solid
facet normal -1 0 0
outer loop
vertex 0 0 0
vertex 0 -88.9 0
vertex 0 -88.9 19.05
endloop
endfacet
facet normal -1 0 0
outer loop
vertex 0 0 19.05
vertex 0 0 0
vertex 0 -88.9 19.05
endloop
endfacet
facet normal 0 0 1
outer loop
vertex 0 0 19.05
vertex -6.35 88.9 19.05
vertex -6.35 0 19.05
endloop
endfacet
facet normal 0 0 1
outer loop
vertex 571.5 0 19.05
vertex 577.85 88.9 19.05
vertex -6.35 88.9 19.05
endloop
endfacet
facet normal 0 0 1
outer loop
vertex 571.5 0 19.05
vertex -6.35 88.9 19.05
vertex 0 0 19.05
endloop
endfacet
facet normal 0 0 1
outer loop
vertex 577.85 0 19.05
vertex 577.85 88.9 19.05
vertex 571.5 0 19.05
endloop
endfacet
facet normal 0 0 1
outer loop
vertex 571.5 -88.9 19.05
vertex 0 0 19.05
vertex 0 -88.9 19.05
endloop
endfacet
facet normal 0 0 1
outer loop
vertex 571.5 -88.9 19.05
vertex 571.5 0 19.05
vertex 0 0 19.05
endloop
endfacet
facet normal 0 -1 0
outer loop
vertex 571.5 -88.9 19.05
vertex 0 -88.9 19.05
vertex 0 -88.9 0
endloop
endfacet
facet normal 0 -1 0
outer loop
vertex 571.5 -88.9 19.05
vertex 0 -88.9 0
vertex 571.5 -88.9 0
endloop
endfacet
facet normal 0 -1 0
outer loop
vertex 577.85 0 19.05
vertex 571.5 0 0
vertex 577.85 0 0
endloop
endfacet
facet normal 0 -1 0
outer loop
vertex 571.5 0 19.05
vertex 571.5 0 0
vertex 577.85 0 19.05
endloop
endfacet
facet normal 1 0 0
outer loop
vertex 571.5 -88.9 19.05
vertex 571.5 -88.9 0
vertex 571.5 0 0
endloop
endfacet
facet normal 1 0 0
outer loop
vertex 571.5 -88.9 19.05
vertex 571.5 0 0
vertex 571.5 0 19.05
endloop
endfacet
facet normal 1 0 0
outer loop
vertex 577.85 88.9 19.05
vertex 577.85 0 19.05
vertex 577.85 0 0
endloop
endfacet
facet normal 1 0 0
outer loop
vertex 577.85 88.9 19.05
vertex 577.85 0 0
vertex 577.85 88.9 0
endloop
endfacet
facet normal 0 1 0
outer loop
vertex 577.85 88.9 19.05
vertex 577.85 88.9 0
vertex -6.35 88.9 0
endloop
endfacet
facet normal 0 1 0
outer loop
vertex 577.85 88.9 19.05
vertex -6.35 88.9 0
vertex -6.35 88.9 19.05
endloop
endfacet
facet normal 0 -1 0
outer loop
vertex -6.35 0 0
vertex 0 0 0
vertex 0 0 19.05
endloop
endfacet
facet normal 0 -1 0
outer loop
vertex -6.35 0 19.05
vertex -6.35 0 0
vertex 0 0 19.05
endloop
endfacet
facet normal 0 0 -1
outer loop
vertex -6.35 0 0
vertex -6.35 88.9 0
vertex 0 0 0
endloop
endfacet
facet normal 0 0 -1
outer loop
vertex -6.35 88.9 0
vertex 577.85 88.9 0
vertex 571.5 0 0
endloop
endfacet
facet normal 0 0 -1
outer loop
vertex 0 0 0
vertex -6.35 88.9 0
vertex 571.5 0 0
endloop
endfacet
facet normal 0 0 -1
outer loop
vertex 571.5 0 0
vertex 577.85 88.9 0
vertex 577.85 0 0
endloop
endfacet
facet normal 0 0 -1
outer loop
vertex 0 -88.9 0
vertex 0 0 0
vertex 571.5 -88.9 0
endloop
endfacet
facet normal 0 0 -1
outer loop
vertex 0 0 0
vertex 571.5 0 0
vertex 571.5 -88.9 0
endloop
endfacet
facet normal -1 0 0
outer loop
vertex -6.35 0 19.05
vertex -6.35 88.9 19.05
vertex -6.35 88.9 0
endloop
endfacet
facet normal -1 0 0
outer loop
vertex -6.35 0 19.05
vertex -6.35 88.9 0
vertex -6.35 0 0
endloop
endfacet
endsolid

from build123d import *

# Parameters (mm, degrees)
F0_W          = 571.5
F0_H          = 19.05
F1_DEPTH      = 88.9
F2_W          = 88.9
F2_H          = 19.05
F3_DEPTH      = 6.35
F4_W          = 88.9
F4_H          = 19.05
F5_DEPTH      = 6.35
F5_DEPTH_BACK = 25.4


with BuildPart() as f1:
    # F0 (on Front) → F1 (new body, symmetric)
    with BuildSketch(Plane.XZ):
        with Locations((285.75, 9.525)):
            Rectangle(F0_W, F0_H)
    extrude(amount=F1_DEPTH, both=True)

    # F2 (on face) → F3 (join)
    with BuildSketch(Plane.YZ.offset(571.5)):
        with Locations((44.45, 9.525)):
            Rectangle(F2_W, F2_H)
    extrude(amount=F3_DEPTH)

    # F4 (on face) → F5 (join, two sides)
    with BuildSketch(Plane(origin=(0, 0, 0), x_dir=(0, -1, 0), z_dir=(-1, 0, 0))) as f5_sk:
        with Locations((-44.45, 9.525)):
            Rectangle(F4_W, F4_H)
    extrude(amount=F5_DEPTH)
    extrude(f5_sk.sketch, amount=-F5_DEPTH_BACK)


solid = f1.part
